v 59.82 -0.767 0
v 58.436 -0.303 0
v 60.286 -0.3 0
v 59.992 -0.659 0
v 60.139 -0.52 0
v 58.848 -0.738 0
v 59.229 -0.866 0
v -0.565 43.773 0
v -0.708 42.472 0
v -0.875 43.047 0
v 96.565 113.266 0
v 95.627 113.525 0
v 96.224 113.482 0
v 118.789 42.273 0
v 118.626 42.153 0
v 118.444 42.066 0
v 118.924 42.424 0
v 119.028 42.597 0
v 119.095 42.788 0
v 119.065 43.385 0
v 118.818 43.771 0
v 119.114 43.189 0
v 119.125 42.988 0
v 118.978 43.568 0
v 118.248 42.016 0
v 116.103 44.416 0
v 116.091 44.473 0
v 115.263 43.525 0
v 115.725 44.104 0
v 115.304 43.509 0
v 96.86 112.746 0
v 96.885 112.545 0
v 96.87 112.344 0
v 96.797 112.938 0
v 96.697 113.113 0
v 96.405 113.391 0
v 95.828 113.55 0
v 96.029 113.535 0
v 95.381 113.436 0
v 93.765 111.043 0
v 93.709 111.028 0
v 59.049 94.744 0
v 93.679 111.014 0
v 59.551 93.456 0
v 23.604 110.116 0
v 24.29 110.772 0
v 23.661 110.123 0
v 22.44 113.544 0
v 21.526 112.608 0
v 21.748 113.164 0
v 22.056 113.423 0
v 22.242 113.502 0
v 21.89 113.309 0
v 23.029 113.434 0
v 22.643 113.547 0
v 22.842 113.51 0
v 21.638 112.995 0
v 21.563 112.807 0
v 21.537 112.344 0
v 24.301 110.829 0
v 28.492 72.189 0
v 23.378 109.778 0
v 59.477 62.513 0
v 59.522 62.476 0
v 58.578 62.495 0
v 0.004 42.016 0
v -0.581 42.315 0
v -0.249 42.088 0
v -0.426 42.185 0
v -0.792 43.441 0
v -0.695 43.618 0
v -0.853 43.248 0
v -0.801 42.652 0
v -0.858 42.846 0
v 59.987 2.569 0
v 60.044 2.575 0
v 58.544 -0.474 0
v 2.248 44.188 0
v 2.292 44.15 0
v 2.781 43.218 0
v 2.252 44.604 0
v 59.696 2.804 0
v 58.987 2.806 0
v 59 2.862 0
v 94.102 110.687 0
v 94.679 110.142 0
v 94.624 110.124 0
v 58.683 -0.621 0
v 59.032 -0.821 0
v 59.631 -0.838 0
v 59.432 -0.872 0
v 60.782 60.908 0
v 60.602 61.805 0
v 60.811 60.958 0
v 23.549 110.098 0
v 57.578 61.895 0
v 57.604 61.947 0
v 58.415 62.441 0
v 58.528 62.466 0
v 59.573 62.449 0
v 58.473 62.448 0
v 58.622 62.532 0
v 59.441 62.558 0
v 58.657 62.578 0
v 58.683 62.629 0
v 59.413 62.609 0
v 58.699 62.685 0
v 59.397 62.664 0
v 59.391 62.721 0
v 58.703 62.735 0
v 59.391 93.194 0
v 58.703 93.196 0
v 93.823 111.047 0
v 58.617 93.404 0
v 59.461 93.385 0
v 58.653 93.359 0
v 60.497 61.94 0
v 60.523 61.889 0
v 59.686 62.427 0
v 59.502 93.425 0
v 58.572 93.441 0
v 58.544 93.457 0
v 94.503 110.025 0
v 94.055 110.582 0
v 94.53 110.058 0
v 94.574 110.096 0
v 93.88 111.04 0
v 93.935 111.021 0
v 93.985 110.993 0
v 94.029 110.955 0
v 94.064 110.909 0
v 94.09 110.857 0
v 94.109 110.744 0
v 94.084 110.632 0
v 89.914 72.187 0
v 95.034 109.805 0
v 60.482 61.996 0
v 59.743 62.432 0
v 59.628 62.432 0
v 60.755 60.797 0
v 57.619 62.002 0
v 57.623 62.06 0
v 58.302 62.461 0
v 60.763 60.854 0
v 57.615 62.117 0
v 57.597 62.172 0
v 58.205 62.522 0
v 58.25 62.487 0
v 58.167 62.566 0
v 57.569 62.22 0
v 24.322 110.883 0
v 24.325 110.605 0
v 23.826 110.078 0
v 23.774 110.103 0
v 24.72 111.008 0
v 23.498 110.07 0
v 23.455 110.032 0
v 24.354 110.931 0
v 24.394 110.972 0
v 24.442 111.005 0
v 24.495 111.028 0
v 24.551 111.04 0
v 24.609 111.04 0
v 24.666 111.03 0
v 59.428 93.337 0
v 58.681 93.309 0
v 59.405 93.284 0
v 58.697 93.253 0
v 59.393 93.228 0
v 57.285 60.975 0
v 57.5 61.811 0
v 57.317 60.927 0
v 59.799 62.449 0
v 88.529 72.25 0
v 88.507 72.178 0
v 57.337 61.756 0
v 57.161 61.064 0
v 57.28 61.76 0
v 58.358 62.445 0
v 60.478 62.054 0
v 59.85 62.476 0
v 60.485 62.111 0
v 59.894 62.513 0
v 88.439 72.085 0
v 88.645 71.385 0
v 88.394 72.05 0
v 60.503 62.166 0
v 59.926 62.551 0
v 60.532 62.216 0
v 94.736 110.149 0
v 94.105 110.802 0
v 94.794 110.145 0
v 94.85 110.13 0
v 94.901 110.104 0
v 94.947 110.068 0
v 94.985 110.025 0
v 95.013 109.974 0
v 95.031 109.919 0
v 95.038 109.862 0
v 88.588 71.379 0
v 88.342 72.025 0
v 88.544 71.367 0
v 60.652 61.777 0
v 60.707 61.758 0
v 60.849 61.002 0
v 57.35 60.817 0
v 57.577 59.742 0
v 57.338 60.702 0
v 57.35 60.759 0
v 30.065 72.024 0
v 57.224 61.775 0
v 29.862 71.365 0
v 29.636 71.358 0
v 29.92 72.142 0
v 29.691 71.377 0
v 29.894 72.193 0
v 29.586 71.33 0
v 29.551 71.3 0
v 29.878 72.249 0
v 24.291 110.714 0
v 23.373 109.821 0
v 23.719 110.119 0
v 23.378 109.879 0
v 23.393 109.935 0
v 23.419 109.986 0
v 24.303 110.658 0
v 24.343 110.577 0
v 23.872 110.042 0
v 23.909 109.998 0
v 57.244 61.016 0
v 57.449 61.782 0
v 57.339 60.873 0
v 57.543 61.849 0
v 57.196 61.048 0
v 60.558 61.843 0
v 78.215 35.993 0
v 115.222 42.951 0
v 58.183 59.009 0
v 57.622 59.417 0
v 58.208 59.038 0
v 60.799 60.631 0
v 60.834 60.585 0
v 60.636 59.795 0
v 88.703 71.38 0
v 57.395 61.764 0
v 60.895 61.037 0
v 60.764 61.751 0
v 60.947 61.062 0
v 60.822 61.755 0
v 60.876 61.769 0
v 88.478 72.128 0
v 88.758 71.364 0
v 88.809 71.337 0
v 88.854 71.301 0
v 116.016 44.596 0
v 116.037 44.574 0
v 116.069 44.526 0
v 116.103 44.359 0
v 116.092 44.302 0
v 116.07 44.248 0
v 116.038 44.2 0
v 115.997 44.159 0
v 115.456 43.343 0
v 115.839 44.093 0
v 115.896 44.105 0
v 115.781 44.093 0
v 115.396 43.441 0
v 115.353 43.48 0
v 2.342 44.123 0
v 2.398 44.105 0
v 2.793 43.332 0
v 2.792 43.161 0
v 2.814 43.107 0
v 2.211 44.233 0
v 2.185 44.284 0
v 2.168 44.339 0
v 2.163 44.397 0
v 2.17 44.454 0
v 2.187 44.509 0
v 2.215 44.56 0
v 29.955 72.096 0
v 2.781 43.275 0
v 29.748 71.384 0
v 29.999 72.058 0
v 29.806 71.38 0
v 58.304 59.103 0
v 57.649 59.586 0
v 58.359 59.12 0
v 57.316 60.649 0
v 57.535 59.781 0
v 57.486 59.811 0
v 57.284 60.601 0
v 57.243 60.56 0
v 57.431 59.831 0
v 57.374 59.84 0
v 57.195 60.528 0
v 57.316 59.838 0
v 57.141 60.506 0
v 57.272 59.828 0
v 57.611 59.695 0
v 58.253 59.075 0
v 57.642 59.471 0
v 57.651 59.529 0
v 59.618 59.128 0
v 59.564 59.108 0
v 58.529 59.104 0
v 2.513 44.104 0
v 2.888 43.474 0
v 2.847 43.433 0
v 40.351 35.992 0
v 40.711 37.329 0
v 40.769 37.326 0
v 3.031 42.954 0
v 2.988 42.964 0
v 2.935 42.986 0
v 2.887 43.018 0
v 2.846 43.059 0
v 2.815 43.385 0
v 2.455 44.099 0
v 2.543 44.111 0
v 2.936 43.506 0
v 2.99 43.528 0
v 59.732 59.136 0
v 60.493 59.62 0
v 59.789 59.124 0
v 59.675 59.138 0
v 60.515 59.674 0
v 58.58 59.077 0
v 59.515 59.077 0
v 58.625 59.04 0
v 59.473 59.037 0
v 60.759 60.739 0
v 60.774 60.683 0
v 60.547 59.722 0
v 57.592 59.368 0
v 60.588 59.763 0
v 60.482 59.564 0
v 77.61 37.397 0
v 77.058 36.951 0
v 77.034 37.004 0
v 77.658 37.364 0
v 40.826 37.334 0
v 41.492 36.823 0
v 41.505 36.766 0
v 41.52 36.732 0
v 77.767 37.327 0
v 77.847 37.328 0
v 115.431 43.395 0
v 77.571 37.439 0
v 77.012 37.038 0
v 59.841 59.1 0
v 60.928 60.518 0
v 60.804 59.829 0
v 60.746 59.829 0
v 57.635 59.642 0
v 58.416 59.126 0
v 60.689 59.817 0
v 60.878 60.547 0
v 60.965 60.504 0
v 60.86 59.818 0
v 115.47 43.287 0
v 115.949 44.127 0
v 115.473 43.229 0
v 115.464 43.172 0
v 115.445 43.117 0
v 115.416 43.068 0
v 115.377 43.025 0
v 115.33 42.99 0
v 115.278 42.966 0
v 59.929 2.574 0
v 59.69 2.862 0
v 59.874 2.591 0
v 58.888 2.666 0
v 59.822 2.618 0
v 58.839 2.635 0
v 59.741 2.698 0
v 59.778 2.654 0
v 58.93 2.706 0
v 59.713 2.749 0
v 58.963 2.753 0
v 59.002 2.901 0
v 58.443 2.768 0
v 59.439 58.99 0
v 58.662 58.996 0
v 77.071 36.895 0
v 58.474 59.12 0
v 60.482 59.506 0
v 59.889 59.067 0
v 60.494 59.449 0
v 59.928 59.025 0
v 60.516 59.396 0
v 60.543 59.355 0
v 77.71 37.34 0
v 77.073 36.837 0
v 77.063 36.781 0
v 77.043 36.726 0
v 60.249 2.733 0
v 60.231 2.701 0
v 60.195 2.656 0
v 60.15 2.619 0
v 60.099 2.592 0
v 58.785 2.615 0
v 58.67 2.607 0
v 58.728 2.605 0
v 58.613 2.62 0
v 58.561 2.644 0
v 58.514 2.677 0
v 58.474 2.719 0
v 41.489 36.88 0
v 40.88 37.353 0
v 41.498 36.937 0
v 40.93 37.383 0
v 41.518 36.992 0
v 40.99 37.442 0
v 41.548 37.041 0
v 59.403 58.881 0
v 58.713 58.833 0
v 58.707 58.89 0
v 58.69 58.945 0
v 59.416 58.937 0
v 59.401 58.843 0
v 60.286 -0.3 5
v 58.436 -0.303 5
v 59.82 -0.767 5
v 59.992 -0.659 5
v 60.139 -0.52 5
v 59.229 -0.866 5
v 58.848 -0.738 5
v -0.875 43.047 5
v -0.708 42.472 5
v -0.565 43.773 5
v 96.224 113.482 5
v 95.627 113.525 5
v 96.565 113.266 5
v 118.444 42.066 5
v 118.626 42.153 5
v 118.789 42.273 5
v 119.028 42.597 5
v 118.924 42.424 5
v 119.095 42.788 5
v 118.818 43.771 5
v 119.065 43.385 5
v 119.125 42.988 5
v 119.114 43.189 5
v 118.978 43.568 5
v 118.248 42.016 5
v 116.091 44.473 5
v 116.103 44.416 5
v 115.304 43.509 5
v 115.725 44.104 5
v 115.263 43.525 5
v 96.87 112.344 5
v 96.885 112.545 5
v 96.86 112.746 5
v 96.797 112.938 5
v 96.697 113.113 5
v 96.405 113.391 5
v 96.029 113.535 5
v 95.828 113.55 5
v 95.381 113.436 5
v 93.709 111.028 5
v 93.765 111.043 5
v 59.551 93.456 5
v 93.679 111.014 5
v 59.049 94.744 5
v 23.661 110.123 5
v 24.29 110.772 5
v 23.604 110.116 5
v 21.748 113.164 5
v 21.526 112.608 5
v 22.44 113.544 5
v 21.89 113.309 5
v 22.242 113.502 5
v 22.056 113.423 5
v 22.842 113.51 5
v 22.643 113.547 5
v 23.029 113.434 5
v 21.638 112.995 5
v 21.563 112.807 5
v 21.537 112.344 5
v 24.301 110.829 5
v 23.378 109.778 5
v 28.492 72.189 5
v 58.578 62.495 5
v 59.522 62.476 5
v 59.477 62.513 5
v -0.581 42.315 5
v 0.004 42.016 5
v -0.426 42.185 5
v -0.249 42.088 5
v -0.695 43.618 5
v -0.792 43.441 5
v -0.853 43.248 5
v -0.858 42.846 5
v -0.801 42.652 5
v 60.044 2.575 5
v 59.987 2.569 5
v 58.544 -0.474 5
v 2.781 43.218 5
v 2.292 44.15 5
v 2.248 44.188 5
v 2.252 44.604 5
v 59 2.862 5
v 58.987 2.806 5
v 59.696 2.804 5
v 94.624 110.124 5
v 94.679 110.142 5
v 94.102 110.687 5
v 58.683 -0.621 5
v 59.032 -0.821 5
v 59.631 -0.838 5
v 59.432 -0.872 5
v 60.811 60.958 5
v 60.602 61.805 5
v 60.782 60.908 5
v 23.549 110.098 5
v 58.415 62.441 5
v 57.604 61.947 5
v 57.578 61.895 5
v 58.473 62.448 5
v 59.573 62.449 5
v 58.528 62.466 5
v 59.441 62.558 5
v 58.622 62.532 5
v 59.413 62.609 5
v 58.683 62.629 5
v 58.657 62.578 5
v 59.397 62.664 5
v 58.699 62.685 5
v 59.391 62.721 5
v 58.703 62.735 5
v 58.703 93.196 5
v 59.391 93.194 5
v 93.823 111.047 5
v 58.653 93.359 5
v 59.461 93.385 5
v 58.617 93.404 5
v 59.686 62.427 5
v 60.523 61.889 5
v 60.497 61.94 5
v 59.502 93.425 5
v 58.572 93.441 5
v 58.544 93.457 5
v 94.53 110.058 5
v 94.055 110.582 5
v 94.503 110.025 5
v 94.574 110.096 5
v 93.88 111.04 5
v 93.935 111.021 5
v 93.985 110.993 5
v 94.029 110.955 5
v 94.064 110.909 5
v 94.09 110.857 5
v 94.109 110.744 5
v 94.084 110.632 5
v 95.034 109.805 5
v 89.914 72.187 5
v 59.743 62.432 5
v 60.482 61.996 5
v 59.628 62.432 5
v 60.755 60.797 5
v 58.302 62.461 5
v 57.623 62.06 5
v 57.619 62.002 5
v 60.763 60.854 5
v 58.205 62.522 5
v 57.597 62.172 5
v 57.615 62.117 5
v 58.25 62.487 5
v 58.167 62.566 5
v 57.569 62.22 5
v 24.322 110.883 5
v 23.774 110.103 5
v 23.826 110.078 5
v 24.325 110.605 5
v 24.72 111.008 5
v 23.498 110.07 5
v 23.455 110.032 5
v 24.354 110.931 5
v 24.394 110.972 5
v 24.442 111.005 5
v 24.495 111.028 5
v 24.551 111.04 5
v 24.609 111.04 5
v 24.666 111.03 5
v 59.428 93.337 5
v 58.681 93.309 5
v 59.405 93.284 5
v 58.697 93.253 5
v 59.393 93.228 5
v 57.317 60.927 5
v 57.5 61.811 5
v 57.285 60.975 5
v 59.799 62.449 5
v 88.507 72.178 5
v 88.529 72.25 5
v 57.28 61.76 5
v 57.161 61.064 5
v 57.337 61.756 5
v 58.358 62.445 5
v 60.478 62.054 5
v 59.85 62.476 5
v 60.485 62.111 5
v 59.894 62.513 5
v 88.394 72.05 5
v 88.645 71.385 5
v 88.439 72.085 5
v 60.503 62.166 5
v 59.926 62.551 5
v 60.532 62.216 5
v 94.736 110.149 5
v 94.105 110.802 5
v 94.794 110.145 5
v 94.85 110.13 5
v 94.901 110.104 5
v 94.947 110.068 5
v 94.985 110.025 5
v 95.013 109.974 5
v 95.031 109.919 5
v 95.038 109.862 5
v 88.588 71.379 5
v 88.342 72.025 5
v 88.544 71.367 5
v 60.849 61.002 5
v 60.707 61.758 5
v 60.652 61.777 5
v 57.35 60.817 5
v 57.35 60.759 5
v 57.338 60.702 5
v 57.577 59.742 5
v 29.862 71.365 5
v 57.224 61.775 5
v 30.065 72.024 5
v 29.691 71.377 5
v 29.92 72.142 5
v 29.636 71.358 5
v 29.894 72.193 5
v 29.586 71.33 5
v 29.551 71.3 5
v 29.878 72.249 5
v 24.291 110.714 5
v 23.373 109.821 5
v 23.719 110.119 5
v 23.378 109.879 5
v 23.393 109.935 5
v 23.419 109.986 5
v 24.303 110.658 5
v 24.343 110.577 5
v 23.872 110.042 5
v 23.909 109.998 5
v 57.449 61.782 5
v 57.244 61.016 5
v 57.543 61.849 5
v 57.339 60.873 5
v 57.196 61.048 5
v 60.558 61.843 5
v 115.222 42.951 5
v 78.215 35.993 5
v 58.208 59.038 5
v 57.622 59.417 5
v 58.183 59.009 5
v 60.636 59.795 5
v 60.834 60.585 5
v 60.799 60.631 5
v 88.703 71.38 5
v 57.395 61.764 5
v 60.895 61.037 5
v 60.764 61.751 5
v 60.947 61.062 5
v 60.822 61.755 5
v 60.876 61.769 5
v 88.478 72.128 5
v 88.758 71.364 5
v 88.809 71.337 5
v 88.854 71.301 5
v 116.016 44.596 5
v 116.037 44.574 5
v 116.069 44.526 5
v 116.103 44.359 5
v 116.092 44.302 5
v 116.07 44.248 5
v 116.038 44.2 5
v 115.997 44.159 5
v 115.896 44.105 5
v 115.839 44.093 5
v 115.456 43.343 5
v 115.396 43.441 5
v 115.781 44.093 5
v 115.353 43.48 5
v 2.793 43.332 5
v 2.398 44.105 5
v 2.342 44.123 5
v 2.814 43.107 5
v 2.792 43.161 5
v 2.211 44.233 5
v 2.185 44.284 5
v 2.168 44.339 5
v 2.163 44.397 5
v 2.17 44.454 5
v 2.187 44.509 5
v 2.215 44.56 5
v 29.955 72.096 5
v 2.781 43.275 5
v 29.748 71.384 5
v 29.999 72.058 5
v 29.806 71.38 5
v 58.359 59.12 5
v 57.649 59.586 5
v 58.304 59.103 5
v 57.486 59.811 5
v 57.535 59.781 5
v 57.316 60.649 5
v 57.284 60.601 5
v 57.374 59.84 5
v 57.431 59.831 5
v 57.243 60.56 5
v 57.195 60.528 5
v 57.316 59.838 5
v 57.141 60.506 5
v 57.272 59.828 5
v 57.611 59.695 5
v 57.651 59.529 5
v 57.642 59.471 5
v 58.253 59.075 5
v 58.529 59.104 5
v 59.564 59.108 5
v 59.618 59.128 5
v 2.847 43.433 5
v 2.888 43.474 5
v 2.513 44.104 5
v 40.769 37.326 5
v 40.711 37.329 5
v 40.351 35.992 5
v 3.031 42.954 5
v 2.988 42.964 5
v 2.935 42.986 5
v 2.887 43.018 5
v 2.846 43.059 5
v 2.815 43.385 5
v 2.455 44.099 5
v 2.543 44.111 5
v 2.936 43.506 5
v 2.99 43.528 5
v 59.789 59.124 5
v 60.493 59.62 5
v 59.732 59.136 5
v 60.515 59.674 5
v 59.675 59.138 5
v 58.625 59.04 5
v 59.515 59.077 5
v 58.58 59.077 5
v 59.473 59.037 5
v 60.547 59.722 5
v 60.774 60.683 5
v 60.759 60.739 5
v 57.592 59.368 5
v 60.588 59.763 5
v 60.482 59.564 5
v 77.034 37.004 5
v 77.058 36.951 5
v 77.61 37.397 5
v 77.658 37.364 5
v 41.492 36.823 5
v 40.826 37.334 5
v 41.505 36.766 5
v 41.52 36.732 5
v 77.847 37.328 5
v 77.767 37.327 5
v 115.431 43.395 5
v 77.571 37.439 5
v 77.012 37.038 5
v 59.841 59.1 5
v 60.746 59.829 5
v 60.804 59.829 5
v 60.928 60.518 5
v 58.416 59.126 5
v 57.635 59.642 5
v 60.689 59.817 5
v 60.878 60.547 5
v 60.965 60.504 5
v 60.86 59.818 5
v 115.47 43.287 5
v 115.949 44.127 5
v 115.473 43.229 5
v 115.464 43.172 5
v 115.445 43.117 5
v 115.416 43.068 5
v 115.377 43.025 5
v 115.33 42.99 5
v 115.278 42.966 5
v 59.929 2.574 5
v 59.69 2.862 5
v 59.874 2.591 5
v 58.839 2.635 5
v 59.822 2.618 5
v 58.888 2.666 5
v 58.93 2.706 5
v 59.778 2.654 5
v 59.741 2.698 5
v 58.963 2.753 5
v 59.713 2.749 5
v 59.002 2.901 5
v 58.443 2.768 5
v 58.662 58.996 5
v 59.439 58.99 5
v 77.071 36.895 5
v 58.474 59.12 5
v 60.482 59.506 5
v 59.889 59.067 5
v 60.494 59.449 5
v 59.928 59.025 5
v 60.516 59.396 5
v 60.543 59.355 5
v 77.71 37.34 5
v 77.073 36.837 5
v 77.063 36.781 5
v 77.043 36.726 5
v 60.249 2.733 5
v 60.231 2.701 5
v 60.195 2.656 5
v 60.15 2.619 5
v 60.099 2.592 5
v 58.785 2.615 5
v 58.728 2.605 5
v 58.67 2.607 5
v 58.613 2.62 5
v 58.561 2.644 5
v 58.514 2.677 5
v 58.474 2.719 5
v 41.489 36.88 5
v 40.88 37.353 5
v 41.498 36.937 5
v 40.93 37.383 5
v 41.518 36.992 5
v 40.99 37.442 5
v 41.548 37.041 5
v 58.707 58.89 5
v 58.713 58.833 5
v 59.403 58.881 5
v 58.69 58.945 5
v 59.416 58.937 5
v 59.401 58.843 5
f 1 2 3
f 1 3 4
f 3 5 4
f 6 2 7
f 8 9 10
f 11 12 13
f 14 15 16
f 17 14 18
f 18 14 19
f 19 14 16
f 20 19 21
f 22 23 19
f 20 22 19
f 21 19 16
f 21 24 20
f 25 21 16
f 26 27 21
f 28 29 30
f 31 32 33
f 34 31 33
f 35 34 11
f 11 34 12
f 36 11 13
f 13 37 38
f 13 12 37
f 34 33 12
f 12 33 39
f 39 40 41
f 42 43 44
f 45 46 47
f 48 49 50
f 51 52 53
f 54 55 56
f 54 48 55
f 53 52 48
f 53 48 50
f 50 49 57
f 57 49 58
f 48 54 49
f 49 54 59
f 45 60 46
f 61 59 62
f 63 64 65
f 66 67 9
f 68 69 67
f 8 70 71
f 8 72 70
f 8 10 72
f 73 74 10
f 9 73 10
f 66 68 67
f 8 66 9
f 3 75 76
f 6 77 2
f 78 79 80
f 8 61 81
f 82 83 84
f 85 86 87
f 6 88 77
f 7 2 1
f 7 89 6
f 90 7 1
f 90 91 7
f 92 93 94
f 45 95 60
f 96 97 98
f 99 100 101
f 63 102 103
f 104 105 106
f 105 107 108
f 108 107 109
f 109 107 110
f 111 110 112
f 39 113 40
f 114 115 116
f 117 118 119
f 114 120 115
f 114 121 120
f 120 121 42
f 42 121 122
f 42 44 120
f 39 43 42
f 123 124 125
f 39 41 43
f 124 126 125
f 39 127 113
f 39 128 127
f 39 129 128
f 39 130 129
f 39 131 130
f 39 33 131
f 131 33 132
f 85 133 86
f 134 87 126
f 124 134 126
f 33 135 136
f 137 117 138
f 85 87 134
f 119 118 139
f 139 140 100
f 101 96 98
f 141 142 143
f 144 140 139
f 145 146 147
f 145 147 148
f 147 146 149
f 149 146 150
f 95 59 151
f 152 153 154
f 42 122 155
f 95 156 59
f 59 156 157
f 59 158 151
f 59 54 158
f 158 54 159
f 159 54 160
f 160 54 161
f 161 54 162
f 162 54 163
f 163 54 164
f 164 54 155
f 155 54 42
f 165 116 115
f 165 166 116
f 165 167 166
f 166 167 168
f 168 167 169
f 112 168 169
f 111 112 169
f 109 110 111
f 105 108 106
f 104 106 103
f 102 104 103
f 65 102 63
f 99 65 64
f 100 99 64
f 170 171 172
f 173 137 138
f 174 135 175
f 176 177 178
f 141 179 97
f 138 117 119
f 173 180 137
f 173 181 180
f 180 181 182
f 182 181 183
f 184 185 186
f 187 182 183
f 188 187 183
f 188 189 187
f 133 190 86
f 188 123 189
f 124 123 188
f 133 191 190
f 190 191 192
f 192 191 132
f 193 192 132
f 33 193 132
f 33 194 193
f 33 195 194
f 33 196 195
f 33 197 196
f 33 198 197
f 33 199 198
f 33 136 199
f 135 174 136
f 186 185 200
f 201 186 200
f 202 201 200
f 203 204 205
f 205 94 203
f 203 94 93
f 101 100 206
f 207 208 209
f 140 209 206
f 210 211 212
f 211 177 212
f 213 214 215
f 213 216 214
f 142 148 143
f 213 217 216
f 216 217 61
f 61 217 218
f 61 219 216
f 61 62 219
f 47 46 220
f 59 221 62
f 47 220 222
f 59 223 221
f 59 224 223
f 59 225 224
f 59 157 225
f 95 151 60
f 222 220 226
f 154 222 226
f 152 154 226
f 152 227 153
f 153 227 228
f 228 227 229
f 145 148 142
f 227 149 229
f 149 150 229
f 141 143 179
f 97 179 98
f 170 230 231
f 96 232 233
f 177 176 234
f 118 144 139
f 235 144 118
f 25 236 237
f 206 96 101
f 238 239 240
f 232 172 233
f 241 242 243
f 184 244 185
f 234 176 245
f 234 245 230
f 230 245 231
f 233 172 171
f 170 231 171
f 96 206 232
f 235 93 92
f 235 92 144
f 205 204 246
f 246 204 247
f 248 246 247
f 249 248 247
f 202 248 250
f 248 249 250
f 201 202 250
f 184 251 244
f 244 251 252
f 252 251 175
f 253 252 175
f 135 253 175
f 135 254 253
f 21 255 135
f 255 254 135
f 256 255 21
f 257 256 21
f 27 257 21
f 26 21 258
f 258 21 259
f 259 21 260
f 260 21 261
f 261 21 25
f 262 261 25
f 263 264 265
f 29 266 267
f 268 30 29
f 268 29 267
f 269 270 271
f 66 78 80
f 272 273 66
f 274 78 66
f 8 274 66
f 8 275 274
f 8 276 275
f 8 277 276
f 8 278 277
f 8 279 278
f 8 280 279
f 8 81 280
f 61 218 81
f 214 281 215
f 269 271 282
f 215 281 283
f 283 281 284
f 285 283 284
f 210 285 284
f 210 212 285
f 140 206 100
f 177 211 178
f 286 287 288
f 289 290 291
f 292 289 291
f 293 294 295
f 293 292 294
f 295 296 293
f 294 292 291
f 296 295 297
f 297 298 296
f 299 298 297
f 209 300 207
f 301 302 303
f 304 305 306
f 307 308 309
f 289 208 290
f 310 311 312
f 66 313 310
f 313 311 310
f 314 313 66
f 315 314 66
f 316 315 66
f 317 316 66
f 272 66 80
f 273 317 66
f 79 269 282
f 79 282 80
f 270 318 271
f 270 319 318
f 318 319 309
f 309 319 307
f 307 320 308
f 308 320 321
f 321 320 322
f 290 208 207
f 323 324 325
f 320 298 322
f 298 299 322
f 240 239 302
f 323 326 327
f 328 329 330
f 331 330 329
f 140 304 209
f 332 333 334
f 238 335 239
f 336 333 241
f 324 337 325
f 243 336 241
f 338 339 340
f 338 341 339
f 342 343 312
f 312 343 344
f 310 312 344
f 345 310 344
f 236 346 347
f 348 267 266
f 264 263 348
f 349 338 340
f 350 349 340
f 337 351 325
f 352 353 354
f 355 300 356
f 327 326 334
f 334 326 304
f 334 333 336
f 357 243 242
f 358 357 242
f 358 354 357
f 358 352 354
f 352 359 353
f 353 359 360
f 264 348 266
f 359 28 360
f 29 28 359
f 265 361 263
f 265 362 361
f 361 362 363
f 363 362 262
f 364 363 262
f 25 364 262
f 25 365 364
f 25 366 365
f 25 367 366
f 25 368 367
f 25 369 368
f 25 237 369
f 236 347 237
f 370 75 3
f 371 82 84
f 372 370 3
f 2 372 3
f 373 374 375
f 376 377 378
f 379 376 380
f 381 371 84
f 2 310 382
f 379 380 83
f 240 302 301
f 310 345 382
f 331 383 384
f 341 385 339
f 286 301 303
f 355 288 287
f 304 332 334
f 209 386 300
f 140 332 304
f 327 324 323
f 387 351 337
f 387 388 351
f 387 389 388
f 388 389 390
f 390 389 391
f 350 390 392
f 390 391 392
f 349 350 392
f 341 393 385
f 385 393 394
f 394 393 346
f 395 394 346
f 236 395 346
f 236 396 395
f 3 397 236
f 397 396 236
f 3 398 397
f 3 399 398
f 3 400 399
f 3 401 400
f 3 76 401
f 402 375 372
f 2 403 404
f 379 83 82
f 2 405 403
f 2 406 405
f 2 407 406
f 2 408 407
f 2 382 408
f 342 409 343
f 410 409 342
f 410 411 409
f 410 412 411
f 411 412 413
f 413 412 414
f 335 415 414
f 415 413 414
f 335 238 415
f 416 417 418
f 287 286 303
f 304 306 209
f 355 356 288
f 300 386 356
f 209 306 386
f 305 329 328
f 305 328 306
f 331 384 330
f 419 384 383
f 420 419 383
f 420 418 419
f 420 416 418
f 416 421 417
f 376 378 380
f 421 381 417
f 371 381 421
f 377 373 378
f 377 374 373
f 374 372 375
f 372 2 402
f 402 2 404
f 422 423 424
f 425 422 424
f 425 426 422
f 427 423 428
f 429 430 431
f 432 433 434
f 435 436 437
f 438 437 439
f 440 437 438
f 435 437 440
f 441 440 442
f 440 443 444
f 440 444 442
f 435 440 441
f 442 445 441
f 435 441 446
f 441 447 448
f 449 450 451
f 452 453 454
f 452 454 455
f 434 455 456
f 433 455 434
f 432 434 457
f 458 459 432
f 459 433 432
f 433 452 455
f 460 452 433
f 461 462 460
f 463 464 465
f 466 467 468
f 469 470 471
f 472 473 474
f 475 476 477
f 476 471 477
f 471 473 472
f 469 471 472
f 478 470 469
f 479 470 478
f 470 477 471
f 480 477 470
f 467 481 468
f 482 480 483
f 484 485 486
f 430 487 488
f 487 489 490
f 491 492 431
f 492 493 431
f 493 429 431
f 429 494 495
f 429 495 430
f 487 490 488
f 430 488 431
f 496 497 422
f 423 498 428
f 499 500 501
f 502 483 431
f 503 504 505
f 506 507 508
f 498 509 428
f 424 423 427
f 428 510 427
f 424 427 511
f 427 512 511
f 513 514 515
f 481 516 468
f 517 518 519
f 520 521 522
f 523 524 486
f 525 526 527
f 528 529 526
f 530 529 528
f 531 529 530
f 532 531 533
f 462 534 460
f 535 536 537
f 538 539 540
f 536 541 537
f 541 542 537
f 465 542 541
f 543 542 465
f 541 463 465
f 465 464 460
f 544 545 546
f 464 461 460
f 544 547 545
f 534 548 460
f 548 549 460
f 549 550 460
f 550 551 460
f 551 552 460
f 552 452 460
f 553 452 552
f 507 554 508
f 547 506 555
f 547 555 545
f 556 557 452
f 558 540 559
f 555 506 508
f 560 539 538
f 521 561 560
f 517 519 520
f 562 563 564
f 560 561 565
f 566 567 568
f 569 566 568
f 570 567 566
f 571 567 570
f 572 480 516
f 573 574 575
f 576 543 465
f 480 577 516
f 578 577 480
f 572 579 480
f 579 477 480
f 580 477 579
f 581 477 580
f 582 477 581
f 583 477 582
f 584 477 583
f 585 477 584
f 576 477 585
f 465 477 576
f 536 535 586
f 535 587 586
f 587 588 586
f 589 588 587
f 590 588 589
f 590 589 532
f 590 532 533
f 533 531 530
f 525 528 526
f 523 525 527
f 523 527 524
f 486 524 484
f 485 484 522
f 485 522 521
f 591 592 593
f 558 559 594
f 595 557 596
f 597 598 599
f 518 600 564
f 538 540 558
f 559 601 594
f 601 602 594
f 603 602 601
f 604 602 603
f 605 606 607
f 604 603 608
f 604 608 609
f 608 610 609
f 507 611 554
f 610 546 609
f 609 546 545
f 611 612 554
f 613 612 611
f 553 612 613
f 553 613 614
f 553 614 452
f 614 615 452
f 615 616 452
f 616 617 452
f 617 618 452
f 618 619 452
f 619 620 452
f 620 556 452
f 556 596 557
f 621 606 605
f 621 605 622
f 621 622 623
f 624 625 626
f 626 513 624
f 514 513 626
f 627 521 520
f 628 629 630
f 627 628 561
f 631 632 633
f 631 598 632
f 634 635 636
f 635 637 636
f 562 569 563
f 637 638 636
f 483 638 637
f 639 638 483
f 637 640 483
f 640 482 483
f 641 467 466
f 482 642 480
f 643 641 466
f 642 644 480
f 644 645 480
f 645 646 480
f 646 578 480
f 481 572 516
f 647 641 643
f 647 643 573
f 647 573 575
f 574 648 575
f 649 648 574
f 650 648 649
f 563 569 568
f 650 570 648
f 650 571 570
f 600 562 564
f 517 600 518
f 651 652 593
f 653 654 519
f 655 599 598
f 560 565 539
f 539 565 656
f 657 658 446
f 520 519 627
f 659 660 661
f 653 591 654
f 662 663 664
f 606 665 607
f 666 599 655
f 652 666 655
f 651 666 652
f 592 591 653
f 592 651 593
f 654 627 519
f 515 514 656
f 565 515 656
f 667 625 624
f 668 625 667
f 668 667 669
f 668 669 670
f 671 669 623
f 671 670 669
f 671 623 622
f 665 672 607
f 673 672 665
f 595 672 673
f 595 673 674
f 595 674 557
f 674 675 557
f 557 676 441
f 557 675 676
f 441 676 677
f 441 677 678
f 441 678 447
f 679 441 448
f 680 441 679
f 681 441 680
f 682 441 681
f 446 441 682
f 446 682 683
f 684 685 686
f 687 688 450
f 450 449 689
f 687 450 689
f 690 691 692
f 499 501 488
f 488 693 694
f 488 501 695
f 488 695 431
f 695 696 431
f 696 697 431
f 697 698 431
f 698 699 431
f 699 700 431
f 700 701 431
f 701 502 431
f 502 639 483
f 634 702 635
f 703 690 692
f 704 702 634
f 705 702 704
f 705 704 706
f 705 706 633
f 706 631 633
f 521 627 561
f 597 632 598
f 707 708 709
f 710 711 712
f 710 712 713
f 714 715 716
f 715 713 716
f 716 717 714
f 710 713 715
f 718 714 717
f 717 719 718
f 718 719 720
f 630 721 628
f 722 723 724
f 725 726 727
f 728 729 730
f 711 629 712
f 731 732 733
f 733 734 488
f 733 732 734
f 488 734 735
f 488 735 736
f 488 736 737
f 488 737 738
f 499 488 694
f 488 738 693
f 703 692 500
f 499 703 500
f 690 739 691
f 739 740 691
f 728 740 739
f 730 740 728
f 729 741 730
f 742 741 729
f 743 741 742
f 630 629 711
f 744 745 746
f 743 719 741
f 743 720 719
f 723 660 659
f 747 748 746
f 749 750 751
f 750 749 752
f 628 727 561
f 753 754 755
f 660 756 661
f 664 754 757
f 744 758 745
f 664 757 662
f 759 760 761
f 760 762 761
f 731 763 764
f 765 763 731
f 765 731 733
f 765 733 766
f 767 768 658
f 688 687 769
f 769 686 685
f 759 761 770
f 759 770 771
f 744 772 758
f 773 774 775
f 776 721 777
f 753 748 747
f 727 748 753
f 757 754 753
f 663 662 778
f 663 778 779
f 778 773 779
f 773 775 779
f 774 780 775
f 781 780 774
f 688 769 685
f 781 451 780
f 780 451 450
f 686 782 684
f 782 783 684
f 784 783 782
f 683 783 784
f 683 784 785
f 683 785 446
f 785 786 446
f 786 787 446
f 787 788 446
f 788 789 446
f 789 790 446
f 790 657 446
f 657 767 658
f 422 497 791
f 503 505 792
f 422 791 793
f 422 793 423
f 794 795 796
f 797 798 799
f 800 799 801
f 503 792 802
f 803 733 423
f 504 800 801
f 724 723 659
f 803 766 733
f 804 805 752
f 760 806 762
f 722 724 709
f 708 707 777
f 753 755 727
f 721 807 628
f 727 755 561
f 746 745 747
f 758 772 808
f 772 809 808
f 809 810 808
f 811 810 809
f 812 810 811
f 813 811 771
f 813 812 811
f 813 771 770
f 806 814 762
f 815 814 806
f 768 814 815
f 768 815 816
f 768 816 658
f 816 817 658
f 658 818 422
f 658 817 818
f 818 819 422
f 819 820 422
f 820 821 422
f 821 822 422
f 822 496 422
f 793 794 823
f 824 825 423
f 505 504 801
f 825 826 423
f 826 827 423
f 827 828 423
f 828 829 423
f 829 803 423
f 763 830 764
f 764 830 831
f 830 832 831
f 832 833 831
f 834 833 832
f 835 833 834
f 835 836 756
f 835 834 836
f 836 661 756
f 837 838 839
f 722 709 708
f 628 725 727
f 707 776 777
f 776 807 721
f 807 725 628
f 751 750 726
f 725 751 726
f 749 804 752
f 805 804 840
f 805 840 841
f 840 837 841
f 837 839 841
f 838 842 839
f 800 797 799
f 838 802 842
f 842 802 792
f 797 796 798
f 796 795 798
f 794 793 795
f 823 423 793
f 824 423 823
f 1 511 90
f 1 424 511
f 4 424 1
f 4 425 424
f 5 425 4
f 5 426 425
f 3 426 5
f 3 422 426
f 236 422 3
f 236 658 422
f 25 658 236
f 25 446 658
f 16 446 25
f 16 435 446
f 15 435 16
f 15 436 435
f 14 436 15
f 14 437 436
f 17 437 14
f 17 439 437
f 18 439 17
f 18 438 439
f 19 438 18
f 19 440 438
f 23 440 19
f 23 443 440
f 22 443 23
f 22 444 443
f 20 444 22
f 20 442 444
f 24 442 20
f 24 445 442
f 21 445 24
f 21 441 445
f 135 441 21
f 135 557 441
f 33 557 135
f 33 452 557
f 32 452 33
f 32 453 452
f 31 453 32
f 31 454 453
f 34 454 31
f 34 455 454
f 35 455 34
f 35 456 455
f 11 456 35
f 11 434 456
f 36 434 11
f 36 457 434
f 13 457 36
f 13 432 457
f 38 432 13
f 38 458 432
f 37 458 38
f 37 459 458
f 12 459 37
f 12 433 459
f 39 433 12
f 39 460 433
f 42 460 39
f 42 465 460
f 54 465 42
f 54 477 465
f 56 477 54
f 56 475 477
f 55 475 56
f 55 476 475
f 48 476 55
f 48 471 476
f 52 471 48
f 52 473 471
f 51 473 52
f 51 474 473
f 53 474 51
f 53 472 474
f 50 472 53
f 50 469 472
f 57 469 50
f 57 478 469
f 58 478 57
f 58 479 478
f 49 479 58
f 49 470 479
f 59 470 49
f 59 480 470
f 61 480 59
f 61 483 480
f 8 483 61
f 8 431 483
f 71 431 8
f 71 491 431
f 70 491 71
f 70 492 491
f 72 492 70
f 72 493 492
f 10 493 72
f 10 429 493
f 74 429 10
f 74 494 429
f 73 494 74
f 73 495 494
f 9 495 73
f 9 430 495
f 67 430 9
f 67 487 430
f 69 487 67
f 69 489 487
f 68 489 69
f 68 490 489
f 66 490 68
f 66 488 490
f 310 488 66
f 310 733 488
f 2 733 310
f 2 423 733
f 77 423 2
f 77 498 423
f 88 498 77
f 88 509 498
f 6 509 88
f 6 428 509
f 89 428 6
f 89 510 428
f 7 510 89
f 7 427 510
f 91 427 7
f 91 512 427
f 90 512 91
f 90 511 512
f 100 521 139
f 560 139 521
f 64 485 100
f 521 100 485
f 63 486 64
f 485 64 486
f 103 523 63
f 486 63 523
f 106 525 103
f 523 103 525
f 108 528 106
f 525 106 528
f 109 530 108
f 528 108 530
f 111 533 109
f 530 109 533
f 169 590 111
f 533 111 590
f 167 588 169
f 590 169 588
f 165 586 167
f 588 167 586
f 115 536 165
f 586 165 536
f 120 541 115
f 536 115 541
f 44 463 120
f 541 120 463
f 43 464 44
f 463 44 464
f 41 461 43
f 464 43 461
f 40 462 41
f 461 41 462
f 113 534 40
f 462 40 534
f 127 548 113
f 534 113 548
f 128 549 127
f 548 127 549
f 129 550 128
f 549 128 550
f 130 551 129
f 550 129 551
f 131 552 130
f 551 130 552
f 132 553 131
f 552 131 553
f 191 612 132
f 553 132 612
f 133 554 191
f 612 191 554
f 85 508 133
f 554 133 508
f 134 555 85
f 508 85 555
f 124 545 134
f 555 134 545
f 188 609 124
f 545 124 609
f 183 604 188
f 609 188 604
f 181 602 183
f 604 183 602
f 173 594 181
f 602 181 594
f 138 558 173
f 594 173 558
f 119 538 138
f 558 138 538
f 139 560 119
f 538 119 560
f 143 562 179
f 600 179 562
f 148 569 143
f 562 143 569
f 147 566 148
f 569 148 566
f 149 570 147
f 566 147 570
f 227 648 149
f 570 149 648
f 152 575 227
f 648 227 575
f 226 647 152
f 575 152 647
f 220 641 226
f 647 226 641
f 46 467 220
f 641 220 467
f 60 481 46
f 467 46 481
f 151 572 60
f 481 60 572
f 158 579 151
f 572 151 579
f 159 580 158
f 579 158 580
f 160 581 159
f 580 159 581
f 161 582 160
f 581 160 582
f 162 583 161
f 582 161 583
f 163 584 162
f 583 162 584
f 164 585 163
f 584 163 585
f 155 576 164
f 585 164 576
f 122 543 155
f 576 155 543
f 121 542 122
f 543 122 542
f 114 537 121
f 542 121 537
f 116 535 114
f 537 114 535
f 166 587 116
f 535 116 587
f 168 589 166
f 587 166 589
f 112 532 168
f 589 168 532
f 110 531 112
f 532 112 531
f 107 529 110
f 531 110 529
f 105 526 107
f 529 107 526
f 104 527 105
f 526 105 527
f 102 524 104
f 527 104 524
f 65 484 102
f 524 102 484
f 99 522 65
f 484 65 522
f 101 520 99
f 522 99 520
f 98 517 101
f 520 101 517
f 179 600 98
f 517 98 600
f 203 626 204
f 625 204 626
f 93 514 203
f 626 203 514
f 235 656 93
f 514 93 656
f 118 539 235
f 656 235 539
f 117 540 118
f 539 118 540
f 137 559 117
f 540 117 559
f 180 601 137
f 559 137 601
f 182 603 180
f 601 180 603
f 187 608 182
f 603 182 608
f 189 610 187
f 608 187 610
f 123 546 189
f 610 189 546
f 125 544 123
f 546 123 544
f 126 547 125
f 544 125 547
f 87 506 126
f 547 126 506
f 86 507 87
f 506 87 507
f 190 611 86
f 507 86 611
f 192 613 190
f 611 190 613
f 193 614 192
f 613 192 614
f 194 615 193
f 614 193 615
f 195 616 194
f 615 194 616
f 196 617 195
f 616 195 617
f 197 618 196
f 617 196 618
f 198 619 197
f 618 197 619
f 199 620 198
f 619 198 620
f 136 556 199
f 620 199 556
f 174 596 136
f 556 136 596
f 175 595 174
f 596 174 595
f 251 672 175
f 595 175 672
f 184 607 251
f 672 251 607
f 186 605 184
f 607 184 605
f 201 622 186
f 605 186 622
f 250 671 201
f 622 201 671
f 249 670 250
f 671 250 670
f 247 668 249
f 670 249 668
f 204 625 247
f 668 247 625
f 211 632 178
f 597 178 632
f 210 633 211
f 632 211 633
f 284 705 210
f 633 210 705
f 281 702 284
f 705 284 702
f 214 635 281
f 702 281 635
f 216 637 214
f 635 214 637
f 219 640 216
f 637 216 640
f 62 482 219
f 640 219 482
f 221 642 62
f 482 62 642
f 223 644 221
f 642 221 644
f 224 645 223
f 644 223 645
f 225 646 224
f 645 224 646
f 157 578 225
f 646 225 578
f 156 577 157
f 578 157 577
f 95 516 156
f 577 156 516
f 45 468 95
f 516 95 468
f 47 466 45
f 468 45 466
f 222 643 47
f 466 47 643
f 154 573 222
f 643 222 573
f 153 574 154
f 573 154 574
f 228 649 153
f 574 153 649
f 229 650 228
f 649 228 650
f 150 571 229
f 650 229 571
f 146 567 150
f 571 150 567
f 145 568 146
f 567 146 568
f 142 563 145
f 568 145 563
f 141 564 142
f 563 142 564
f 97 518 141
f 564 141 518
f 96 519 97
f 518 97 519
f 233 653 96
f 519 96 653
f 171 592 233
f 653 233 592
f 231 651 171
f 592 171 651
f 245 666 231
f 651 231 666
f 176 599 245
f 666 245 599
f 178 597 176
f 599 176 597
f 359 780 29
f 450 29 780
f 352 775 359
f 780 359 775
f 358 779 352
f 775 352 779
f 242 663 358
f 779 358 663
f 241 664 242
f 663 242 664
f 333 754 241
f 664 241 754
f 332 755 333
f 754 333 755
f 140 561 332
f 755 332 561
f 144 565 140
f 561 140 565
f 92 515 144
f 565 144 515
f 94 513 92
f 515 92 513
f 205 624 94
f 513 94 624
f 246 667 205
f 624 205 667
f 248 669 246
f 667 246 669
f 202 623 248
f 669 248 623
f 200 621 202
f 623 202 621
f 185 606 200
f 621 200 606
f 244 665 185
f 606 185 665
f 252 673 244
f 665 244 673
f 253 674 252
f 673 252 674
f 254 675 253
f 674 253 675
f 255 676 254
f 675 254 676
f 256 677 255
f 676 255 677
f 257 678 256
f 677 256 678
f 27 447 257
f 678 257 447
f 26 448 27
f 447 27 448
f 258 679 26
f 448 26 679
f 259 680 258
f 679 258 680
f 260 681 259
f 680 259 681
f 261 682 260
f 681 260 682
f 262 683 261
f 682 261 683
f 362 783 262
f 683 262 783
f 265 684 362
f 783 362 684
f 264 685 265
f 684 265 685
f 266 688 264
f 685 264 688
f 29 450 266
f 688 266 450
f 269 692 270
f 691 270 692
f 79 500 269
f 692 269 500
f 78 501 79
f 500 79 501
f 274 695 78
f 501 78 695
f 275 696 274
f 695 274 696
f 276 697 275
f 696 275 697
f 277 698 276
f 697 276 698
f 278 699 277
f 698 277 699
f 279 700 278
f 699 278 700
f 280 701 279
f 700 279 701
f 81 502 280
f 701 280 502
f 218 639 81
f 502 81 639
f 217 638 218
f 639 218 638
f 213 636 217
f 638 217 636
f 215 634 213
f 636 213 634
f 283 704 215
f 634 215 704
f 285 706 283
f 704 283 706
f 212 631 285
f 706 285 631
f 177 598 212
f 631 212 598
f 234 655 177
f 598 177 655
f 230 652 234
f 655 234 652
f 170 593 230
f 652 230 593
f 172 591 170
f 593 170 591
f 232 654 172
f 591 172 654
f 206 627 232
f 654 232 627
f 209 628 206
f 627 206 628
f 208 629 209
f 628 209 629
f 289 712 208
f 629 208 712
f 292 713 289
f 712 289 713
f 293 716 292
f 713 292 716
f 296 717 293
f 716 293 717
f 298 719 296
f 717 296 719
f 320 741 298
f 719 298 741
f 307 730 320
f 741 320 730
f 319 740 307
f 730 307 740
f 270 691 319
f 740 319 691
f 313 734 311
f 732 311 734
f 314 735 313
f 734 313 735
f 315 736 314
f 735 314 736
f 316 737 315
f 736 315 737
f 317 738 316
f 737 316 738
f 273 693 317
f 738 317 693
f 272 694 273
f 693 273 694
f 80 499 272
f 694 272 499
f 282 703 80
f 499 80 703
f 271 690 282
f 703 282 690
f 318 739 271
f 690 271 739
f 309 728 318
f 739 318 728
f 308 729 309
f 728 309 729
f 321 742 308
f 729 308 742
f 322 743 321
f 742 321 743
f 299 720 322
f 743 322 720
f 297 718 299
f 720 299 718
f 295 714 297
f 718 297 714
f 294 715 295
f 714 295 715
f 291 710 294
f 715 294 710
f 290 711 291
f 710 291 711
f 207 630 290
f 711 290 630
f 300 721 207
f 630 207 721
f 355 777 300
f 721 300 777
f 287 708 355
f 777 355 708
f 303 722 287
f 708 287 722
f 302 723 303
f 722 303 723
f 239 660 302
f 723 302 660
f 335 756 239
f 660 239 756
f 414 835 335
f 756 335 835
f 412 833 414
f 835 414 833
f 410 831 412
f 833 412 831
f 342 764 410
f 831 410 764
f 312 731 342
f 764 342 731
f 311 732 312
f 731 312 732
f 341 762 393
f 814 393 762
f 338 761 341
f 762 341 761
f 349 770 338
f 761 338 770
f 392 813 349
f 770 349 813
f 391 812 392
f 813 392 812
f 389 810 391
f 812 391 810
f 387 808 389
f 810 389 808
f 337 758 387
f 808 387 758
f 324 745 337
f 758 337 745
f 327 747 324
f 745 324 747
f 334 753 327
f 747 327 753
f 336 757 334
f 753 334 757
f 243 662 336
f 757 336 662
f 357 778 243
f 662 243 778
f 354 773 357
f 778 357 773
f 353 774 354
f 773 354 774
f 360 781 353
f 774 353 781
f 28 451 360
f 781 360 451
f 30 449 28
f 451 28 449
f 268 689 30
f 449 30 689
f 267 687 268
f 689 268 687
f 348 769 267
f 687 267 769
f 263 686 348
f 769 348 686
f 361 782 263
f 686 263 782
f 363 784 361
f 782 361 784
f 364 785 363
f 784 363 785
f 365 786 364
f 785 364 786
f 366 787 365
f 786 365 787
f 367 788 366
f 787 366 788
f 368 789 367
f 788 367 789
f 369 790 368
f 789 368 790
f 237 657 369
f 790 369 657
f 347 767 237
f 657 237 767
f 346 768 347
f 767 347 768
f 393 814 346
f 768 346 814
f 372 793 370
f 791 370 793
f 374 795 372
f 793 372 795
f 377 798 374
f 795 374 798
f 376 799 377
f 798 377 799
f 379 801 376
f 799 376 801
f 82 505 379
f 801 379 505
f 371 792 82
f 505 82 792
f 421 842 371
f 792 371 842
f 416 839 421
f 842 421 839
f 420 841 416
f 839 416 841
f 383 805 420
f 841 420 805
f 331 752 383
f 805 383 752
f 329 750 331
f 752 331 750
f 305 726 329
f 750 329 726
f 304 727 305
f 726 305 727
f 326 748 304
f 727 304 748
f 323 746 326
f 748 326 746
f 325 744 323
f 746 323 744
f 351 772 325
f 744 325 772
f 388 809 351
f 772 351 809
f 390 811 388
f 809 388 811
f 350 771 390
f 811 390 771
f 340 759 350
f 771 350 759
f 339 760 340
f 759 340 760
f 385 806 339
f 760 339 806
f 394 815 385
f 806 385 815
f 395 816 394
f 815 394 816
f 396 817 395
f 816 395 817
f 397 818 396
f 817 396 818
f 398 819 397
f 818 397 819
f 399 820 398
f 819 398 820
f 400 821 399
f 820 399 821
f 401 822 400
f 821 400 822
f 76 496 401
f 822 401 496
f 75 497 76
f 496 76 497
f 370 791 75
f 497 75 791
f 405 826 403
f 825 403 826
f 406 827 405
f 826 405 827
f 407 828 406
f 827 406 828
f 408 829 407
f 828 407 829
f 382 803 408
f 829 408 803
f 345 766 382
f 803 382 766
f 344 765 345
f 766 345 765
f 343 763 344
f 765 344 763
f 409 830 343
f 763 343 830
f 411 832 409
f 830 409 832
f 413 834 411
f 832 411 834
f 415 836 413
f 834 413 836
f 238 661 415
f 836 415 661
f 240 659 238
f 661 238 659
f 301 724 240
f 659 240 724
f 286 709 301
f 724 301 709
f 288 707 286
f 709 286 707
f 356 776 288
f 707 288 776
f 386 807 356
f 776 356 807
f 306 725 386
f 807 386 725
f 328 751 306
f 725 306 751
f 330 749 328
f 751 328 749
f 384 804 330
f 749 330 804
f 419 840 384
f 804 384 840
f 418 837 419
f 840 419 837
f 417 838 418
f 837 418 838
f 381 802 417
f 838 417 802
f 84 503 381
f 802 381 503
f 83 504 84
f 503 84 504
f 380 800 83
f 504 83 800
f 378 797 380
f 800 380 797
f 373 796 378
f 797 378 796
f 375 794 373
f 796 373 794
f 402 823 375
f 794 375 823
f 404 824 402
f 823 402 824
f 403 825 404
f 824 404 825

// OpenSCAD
/*
 * Customizable Origami - Christmas Star No. 1 - https://www.thingiverse.com/thing:2641203
 * by Dennis Hofmann - https://www.thingiverse.com/mightynozzle/about
 * created 2017-11-12
 * version v1.0
 *
 * Changelog
 * --------------
 * v1.0:
 *      - final design
 * --------------
 * 
 * This work is licensed under the Creative Commons - Attribution - NonCommercial - ShareAlike license.
 * https://creativecommons.org/licenses/by-nc-sa/3.0/
 */


 // Parameter Section //
//-------------------//

// preview[view:north, tilt:top]

// The maximum size of the longest side. The shorter side will be automatically resized in same ratio.
max_size_in_millimeter = 120; //[20:300]

// The height of the model.
model_height_in_millimeter = 5; //[0.2:0.2:100]

// Thickness of the outer outline.
outline_size_in_millimeter = 1.4; //[0.5:0.1:20]

// Thickness of the inner outline.
inline_size_in_millimeter = 0.7; //[0.5:0.1:20]

// Roundiness of the ends of the inner outlines.
inline_edge_radius_in_millimeter = 0.3; //[0.0:0.1:5]

// Flip model
flip_model = "no"; //[yes,no]

/*[hidden]*/
max_size = max_size_in_millimeter;
model_height = model_height_in_millimeter;
$fn=32;

// Outer Points
A1 = [379, 1];
A2 = [495, 236];
A3 = [754, 275];
A4 = [567, 459];
A5 = [612, 719];
A6 = [377, 598];
A7 = [144, 719];
A8 = [189, 459];
A9 = [1, 275];
A10 = [262, 236];

outline = [A1, A2, A3, A4, A5, A6, A7, A8, A9, A10];

// Inner Points
B1 = [377, 388];

// Polygons
C1 = [A10, A1, B1];
C2 = [A1, A2, B1];
C3 = [A2, A3, B1];
C4 = [B1, A3, A4];
C5 = [B1, A4, A5];
C6 = [A5, A6, B1];
C7 = [B1, A6, A7];
C8 = [A7, A8, B1];
C9 = [B1, A9, A8];
C10 = [A9, A10, B1];

cut_polygons = [C1, C2, C3, C4, C5, C6, C7, C8, C9, C10];

min_x = A9[0];
min_y = A1[1];
max_x = A3[0];
max_y = A5[1];

x_size = max_x - min_x;
y_size = max_y - min_y;

x_factor = max_size / x_size;
y_factor = max_size / y_size;

inline_size = x_size > y_size ? inline_size_in_millimeter / x_factor / 2: inline_size_in_millimeter / y_factor / 2;
inline_edge_radius = x_size > y_size ? inline_edge_radius_in_millimeter / x_factor: inline_edge_radius_in_millimeter / y_factor;
outline_size = x_size > y_size ? outline_size_in_millimeter / x_factor - inline_size: outline_size_in_millimeter / y_factor - inline_size;


 // Program Section //
//-----------------//

if(x_size > y_size) {
    resize(newsize=[max_size, x_factor * y_size, model_height]){
        if(flip_model == "yes") {
            mirror([0,1,0]) {
                rotate([180,180,0]) {    
                    create(outline, cut_polygons);
                }
            }
        } else {
            create(outline, cut_polygons);
        }
    }
} else {
    resize(newsize=[y_factor * x_size, max_size, model_height]){
        if(flip_model == "yes") {
            mirror([0,1,0]) {
                rotate([180,180,0]) {    
                    create(outline, cut_polygons);
                }
            }
        } else {
            create(outline, cut_polygons);
        }
    }
}


 // Module Section //
//----------------//

module create() {
    linear_extrude(height=1) {
        difference() {
            offset(r = -0) {
                offset(r = +outline_size) {
                    polygon(points = outline, convexity = 10);
                }
            }
            
            for(cut_polygon = [0:len(cut_polygons)]) {
                offset(r = +inline_edge_radius) {
                    offset(r = -inline_size - inline_edge_radius) {
                        polygon(points = cut_polygons[cut_polygon], convexity = 10);
                    }
                }
            }
        }
    }
}
